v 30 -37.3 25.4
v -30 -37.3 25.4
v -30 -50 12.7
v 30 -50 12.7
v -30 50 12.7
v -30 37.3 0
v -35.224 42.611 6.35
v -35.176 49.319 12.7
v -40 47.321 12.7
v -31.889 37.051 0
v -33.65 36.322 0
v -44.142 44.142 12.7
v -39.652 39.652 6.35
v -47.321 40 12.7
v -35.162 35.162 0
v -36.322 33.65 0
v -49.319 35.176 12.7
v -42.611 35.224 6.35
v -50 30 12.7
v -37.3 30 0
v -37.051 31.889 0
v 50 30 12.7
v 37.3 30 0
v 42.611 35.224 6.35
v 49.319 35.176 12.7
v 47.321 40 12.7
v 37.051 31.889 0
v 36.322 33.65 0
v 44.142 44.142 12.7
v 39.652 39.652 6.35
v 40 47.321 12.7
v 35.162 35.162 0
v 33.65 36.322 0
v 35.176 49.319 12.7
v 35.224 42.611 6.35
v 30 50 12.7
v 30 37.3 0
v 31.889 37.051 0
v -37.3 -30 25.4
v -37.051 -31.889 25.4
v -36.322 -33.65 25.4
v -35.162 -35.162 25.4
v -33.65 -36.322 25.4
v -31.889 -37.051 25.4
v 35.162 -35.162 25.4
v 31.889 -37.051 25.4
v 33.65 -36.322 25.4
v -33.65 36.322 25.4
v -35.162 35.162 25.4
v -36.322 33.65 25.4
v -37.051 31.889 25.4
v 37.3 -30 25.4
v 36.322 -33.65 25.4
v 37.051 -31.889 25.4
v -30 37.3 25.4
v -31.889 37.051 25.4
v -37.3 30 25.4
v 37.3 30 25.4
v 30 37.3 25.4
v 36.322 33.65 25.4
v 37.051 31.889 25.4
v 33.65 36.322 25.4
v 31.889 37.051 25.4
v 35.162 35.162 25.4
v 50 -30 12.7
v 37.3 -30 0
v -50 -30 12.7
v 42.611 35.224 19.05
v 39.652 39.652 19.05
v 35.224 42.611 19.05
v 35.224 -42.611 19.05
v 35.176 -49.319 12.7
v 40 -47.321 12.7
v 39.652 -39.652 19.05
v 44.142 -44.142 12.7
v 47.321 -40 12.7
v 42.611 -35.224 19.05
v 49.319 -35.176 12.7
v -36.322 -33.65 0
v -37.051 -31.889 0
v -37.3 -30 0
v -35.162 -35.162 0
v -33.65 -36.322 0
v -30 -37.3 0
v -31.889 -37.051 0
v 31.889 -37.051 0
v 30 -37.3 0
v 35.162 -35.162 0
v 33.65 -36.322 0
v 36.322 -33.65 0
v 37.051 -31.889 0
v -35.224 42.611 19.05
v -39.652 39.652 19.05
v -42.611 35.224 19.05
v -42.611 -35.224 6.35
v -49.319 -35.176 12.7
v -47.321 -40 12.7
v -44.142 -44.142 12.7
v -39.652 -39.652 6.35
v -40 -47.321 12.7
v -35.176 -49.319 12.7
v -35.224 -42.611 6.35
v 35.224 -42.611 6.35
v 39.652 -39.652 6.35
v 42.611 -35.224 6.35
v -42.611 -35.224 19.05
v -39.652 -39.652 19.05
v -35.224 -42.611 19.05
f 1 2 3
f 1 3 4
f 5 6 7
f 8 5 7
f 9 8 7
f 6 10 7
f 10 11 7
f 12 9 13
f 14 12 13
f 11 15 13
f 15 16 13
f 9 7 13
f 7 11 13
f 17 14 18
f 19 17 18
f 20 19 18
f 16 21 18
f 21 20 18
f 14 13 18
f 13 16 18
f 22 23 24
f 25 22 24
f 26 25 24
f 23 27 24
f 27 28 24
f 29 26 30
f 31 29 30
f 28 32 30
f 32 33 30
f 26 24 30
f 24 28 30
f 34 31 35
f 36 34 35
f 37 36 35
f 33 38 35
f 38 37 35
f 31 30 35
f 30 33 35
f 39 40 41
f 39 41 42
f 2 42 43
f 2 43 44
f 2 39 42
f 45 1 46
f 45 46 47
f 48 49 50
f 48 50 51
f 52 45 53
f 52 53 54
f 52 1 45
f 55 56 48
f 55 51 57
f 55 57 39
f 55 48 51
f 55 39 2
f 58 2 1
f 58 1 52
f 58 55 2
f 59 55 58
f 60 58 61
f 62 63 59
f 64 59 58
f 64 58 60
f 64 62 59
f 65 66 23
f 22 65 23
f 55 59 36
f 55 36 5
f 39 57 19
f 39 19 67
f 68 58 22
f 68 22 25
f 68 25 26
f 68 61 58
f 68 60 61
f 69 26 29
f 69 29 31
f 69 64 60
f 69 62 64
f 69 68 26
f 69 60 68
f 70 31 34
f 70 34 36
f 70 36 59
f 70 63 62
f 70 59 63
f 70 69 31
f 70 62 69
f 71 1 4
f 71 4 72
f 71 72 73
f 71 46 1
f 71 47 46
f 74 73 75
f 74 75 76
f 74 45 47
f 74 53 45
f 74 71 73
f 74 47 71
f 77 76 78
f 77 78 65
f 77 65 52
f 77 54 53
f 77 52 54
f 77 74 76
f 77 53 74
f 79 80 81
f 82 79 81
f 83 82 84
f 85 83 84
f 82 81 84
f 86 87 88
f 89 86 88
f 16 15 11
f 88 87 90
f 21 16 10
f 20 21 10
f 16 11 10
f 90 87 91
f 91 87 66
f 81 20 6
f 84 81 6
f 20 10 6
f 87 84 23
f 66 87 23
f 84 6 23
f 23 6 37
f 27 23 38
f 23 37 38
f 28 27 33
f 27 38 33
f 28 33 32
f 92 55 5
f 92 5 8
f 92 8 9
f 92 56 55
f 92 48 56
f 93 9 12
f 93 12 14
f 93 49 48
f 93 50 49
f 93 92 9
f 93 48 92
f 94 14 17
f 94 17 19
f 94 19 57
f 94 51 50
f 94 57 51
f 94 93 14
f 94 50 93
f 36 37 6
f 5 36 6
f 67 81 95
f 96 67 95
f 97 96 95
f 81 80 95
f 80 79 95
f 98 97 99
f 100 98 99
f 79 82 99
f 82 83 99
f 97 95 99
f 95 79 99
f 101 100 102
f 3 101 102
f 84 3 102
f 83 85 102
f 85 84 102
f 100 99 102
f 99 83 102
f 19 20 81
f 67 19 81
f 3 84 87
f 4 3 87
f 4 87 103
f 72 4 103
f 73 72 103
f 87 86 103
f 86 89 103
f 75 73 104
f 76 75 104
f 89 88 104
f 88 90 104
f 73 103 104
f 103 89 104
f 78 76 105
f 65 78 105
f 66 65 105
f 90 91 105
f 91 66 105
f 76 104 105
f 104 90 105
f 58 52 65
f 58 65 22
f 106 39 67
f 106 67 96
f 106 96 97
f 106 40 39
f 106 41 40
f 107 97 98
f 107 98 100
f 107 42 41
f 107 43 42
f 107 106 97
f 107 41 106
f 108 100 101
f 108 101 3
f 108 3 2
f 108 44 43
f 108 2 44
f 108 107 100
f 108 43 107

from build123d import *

# Parameters (mm, degrees)
F1_DEPTH = 25.4
F2_SIZE  = 12.7
F3_SIZE  = 12.69999


# Not quite as in the source:
# - a fillet or chamfer is up to 0.001 mm smaller than in the source, because OpenCascade refuses the exact size


with BuildPart() as f1:
    # F0 (on Top) → F1 (new body)
    with BuildSketch(Plane.XY):
        with BuildLine():
            Line((-30, -50), (30, -50))
            ThreePointArc((30, -50), (44.1421356237, -44.1421356237), (50, -30))
            Line((50, -30), (50, 30))
            ThreePointArc((50, 30), (44.1421356237, 44.1421356237), (30, 50))
            Line((30, 50), (-30, 50))
            ThreePointArc((-30, 50), (-44.1421356237, 44.1421356237), (-50, 30))
            Line((-50, 30), (-50, -30))
            ThreePointArc((-50, -30), (-44.1421356237, -44.1421356237), (-30, -50))
        make_face()
    extrude(amount=F1_DEPTH)

    # F2
    f2_edges = [f1.edges().sort_by_distance(p)[0] for p in [
        (0, -50, 25.4),
        (44.142136, -44.142136, 25.4),
        (50, 0, 25.4),
        (44.142136, 44.142136, 25.4),
        (0, 50, 25.4),
        (-44.142136, 44.142136, 25.4),
        (-50, 0, 25.4),
        (-44.142136, -44.142136, 25.4),
    ]]
    chamfer(f2_edges, length=F2_SIZE)

    # F3 (size 12.7 in the source; OpenCascade refuses exactly that, so slightly less here)
    f3_edges = [f1.edges().sort_by_distance(p)[0] for p in [
        (0, -50, 0),
        (44.142136, -44.142136, 0),
        (50, 0, 0),
        (44.142136, 44.142136, 0),
        (0, 50, 0),
        (-44.142136, 44.142136, 0),
        (-50, 0, 0),
        (-44.142136, -44.142136, 0),
    ]]
    chamfer(f3_edges, length=F3_SIZE)


solid = f1.part
